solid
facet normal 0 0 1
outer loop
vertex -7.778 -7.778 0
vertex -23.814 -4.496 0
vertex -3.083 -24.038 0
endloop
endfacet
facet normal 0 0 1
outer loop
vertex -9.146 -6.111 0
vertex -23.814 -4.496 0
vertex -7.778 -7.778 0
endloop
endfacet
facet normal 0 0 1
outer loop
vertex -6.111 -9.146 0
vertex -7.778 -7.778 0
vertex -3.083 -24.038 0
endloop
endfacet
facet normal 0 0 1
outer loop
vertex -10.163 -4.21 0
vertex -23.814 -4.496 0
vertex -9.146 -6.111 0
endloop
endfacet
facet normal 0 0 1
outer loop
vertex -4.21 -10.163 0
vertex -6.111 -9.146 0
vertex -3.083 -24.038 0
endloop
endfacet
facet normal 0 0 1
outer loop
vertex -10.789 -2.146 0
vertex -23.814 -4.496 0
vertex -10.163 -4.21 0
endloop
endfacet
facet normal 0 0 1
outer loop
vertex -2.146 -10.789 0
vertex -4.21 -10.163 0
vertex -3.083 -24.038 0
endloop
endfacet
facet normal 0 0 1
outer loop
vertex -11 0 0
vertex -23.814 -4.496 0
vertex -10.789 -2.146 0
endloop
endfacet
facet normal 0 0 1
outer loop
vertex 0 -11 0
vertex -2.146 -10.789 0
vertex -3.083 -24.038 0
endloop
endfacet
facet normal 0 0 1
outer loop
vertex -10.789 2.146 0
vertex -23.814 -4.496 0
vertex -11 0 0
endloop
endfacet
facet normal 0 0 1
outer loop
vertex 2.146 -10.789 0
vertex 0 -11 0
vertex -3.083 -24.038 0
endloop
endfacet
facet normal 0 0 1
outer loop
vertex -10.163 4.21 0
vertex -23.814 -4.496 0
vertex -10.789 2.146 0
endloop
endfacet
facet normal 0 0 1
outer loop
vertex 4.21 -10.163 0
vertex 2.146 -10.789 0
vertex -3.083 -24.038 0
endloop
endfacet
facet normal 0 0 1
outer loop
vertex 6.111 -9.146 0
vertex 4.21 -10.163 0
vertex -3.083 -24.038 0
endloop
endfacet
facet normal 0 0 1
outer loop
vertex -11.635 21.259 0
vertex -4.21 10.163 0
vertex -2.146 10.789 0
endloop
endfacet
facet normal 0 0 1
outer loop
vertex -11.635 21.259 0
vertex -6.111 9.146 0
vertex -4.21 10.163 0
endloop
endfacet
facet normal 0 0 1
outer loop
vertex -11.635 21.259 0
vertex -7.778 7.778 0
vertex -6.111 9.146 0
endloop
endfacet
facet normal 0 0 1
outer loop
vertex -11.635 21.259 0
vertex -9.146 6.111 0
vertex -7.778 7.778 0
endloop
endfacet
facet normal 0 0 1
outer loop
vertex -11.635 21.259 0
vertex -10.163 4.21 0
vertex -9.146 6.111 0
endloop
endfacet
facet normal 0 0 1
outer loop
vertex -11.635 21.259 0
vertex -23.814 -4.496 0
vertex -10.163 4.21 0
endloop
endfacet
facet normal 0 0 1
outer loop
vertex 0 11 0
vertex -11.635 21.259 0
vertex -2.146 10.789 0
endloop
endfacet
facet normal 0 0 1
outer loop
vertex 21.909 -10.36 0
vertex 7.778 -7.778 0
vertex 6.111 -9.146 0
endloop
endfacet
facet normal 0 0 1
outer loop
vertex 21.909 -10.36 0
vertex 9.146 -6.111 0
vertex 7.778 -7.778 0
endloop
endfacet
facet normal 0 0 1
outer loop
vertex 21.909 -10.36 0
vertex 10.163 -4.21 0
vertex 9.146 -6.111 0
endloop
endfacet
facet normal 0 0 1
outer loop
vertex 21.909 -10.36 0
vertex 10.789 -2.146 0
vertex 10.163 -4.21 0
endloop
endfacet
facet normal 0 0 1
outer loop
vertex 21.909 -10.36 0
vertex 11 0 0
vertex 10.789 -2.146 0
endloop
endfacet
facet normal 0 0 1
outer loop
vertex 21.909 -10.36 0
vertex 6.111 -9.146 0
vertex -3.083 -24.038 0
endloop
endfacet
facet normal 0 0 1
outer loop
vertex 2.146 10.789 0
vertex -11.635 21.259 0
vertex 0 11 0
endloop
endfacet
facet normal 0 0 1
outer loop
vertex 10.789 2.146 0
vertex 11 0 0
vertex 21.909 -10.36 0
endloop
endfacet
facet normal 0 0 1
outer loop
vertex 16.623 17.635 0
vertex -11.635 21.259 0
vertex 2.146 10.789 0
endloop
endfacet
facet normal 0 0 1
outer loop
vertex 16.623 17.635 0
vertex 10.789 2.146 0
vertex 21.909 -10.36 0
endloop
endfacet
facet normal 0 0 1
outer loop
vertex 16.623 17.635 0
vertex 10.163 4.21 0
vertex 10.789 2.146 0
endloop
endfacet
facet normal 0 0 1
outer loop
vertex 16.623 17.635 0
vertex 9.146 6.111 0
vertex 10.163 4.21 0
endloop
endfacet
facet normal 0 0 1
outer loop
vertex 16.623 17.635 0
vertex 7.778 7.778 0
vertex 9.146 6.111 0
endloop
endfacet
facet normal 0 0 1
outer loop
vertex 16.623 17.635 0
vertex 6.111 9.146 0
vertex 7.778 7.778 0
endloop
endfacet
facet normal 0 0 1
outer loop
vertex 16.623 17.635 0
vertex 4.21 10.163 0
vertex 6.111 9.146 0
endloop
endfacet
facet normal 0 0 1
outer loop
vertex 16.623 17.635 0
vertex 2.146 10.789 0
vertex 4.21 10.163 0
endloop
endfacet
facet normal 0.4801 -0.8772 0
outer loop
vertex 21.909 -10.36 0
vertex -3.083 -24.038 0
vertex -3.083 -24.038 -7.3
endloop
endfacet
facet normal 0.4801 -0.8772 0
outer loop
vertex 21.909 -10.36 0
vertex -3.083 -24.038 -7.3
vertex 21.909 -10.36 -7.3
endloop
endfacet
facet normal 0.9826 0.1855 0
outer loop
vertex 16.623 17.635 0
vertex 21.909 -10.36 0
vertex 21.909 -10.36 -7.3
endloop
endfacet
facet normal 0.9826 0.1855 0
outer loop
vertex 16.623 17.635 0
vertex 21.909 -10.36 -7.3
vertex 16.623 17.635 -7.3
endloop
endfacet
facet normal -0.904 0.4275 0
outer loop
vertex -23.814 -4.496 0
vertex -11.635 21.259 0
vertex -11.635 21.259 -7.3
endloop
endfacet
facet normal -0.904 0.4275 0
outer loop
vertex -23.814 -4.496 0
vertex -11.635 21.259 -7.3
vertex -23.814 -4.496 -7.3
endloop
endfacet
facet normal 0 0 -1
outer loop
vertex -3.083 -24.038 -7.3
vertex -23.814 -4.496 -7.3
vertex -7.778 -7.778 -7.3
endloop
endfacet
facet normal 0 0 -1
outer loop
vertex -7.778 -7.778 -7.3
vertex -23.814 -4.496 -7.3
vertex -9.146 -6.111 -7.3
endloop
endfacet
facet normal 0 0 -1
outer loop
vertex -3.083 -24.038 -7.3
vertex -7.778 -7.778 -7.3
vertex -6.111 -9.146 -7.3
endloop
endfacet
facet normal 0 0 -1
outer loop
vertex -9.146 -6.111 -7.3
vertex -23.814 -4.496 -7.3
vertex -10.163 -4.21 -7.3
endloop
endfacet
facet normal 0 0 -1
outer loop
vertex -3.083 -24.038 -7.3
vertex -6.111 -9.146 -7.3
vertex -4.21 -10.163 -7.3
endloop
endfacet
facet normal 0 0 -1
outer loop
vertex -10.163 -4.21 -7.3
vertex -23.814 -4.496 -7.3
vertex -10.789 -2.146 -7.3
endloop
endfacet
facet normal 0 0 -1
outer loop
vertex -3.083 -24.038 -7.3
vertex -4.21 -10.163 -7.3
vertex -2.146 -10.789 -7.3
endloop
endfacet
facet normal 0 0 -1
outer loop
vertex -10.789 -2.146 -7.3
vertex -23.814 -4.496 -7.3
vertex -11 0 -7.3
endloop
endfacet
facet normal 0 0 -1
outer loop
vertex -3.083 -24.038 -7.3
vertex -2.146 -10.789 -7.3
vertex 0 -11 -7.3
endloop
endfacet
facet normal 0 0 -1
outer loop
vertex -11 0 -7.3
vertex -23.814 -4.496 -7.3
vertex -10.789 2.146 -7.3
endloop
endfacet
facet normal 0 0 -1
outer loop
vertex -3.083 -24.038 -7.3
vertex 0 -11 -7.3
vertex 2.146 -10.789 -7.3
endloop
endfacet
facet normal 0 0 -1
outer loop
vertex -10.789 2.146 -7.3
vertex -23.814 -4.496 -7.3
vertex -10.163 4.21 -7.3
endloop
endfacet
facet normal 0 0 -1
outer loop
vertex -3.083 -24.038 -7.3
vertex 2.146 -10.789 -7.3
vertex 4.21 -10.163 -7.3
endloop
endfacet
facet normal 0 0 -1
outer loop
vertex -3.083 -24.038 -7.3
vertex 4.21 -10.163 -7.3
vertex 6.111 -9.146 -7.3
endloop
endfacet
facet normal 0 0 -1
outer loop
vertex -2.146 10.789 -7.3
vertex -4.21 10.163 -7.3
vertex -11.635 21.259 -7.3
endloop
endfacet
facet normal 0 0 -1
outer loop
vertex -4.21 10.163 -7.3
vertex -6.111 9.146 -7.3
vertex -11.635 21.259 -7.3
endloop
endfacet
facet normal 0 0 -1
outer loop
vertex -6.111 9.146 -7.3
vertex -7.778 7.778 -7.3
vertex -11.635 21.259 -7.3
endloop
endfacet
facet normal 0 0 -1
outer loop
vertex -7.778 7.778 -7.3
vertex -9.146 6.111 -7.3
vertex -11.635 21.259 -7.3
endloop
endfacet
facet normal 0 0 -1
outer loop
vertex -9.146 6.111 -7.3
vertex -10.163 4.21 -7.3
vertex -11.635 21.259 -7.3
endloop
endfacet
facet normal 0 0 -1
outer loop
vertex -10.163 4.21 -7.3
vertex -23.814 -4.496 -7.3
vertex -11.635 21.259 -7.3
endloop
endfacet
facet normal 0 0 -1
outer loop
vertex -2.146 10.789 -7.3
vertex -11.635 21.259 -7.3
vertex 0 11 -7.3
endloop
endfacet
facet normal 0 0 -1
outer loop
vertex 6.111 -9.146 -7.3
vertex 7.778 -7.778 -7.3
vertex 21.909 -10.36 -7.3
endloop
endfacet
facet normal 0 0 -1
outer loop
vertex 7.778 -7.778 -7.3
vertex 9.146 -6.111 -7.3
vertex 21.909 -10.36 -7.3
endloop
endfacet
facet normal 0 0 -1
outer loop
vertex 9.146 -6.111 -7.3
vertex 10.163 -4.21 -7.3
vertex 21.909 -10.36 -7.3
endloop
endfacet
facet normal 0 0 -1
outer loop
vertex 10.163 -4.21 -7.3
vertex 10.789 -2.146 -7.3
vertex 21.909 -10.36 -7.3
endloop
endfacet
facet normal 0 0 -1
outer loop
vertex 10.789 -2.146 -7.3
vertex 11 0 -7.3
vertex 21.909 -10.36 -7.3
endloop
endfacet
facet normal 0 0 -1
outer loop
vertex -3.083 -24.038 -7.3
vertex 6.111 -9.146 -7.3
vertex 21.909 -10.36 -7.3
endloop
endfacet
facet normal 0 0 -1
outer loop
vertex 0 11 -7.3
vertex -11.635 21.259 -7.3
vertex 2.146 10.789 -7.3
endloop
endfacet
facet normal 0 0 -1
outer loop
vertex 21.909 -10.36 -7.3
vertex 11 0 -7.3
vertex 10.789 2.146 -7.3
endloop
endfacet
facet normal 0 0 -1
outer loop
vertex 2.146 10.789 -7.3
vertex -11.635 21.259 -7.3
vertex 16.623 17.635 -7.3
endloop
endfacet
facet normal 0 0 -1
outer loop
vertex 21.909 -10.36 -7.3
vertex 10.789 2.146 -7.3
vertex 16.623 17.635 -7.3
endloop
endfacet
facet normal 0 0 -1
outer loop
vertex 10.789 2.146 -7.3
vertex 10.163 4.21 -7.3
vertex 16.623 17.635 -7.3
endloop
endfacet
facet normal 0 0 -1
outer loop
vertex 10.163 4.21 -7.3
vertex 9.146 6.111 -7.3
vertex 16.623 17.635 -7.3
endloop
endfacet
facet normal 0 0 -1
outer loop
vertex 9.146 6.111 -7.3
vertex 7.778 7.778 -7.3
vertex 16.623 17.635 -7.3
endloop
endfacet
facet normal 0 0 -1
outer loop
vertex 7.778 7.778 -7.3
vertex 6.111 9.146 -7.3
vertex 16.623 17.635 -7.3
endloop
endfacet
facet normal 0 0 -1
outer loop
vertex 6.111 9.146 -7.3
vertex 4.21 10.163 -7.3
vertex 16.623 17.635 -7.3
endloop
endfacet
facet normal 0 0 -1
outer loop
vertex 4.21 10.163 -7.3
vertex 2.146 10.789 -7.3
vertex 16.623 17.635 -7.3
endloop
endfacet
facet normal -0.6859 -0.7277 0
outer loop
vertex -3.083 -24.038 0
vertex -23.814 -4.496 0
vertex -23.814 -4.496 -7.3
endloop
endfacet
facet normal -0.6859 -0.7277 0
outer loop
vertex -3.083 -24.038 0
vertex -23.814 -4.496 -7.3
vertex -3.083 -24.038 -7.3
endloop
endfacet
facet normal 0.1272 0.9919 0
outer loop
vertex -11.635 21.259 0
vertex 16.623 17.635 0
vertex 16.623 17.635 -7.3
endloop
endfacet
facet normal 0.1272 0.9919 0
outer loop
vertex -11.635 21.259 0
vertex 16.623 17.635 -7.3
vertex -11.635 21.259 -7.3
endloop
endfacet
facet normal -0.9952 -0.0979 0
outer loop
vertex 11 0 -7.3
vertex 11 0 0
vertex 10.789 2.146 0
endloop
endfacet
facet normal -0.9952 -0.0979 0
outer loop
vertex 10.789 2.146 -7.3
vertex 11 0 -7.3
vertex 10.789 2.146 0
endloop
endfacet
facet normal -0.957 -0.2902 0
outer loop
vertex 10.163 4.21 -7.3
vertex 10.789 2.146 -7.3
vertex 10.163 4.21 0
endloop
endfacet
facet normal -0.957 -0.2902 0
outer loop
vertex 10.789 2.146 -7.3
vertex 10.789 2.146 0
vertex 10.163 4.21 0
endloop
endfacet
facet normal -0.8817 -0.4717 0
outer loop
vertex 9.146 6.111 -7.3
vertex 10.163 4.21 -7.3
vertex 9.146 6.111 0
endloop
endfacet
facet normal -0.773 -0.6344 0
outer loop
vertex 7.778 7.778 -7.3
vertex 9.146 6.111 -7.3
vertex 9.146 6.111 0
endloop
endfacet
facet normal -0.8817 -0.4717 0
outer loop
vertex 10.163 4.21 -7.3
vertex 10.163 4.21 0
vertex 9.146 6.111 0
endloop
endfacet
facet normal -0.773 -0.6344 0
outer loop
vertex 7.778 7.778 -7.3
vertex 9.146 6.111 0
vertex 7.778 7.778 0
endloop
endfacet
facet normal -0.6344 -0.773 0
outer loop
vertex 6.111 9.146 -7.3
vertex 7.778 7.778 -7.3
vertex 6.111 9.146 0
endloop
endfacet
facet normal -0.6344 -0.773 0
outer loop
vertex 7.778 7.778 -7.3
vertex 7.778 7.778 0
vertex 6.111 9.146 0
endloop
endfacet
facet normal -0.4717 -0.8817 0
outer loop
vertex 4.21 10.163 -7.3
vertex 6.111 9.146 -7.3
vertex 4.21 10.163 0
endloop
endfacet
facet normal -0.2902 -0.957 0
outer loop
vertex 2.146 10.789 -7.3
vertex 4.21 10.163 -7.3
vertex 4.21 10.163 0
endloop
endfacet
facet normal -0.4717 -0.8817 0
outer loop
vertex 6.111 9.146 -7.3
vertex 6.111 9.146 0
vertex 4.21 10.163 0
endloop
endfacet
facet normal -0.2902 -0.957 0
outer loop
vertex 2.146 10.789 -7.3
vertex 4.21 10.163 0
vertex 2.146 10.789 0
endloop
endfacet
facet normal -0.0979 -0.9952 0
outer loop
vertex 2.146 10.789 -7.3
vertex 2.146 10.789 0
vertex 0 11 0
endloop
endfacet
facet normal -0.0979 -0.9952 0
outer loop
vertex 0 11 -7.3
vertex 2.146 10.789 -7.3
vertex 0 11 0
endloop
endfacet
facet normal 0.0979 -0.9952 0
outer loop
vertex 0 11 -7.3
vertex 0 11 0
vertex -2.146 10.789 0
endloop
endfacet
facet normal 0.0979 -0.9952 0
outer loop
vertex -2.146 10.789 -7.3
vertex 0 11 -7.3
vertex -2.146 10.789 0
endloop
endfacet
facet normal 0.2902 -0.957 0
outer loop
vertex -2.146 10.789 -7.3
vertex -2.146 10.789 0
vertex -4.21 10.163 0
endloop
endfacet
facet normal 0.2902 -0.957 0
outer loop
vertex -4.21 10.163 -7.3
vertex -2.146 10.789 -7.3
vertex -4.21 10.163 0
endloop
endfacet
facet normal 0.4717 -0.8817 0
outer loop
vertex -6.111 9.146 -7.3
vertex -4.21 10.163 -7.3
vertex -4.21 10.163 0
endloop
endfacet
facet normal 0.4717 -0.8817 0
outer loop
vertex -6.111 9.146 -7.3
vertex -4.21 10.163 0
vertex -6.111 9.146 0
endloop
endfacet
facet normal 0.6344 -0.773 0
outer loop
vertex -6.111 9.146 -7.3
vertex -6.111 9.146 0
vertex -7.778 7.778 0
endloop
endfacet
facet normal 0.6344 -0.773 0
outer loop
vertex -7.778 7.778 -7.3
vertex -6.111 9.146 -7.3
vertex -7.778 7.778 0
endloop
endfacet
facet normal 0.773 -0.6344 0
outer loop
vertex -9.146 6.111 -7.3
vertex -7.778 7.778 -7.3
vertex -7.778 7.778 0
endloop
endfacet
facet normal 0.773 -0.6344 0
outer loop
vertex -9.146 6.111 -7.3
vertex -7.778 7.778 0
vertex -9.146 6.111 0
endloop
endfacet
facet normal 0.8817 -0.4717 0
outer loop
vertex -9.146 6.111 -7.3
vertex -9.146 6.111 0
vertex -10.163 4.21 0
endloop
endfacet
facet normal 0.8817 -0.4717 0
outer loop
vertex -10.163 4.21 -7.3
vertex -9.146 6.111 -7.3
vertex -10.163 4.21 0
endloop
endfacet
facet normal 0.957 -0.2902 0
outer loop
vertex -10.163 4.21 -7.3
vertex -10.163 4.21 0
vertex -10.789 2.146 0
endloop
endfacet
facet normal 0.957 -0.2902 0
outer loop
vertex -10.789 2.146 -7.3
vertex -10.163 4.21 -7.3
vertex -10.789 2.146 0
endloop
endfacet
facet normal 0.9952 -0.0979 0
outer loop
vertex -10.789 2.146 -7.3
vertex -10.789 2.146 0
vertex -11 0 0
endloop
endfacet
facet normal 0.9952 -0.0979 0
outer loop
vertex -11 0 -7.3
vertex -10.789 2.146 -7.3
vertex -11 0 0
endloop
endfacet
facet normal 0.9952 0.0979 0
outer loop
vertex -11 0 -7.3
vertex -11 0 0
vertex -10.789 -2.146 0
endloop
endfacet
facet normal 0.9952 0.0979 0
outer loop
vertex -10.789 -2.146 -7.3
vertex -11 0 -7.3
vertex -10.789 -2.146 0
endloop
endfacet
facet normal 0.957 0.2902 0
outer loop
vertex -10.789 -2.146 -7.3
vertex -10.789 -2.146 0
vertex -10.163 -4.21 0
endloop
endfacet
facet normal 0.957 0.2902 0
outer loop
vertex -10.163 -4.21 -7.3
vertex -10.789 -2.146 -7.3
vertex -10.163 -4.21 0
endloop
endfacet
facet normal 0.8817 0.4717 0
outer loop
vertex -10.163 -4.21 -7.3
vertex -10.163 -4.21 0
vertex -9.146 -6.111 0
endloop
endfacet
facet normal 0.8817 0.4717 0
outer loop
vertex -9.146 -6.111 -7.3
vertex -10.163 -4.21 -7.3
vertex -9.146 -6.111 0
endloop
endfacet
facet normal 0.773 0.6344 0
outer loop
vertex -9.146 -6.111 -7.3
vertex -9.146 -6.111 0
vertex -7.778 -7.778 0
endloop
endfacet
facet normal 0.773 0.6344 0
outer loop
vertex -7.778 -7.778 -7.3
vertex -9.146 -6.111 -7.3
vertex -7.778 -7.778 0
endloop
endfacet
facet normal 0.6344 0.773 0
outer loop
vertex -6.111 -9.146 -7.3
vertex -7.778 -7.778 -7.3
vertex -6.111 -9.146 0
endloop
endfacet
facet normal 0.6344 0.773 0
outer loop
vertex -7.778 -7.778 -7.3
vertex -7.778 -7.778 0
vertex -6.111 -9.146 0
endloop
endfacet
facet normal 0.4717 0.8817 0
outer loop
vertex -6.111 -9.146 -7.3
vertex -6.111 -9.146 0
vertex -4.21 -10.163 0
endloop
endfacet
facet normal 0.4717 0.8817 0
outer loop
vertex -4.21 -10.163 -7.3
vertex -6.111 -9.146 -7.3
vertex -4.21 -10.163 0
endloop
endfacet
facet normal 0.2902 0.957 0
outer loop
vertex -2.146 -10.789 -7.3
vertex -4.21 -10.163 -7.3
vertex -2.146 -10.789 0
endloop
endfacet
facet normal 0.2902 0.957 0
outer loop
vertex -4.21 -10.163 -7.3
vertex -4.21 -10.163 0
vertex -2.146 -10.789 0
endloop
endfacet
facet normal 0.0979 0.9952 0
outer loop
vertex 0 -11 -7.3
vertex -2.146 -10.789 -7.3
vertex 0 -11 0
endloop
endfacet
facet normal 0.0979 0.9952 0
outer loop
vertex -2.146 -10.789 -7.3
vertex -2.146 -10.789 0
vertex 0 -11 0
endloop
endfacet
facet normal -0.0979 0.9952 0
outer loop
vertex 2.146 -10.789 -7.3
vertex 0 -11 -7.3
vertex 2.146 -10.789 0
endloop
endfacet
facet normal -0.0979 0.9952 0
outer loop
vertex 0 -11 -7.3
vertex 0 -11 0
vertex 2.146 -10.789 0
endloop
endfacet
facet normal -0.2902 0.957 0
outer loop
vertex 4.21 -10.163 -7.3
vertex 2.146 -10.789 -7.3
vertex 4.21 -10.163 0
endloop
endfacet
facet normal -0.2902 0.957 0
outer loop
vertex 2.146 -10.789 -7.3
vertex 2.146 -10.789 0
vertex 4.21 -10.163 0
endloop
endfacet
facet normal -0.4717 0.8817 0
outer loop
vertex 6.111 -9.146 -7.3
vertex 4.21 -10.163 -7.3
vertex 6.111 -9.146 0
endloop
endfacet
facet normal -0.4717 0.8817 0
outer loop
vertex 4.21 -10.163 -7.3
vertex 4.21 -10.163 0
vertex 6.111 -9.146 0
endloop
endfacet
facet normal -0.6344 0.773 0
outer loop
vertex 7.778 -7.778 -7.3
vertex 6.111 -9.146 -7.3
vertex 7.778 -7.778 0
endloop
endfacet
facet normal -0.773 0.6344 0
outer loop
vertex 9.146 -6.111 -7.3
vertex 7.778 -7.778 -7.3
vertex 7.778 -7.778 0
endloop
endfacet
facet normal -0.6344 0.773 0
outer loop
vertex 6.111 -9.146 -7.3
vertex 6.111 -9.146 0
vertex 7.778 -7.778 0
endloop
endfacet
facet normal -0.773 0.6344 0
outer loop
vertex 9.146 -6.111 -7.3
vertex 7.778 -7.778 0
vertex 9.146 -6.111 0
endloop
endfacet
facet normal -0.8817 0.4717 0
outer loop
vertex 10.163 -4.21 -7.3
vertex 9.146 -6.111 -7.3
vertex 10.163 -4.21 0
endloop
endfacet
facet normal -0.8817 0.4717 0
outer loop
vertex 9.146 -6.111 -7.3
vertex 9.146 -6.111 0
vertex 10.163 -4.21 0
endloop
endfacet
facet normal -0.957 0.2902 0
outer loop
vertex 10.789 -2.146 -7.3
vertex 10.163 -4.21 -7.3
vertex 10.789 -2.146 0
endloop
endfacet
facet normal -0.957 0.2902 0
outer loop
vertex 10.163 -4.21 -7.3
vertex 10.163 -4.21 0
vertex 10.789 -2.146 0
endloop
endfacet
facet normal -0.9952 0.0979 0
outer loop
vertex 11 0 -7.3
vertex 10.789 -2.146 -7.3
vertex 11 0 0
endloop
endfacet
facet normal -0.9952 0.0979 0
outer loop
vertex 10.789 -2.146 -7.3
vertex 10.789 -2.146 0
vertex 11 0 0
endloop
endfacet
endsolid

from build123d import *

# Parameters (mm, degrees)
F2_DEPTH = 7
F3_DEPTH = 2.6
F0_R     = 11
F4_DEPTH = 25
F5_DEPTH = 2.3


with BuildPart() as f2:
    # F1 (on Top) → F2 (new body)
    with BuildSketch(Plane.XY):
        Polygon((-23.813827268, -4.4963938878), (-3.0825526201, -24.0377577259), (21.9087049767, -10.3597574001), (16.6228769451, 17.6350755374), (-11.6352020338, 21.2588334764), align=None)
    extrude(amount=-F2_DEPTH)

    # F3 (add): a face of the model
    f3_faces = [f2.faces().sort_by_distance(p)[0] for p in [
        (0, 0, -7),
    ]]
    extrude(f3_faces, amount=F3_DEPTH)

    # F0 (on Top) → F4 (cut)
    with BuildSketch(Plane.XY):
        Circle(F0_R)
    extrude(amount=-F4_DEPTH, mode=Mode.SUBTRACT)

    # F5 (cut): a face of the model
    f5_faces = [f2.faces().sort_by_distance(p)[0] for p in [
        (-13.0067285738, -13.7987330141, -9.6),
    ]]
    extrude(f5_faces, amount=-F5_DEPTH, mode=Mode.SUBTRACT)


solid = f2.part
